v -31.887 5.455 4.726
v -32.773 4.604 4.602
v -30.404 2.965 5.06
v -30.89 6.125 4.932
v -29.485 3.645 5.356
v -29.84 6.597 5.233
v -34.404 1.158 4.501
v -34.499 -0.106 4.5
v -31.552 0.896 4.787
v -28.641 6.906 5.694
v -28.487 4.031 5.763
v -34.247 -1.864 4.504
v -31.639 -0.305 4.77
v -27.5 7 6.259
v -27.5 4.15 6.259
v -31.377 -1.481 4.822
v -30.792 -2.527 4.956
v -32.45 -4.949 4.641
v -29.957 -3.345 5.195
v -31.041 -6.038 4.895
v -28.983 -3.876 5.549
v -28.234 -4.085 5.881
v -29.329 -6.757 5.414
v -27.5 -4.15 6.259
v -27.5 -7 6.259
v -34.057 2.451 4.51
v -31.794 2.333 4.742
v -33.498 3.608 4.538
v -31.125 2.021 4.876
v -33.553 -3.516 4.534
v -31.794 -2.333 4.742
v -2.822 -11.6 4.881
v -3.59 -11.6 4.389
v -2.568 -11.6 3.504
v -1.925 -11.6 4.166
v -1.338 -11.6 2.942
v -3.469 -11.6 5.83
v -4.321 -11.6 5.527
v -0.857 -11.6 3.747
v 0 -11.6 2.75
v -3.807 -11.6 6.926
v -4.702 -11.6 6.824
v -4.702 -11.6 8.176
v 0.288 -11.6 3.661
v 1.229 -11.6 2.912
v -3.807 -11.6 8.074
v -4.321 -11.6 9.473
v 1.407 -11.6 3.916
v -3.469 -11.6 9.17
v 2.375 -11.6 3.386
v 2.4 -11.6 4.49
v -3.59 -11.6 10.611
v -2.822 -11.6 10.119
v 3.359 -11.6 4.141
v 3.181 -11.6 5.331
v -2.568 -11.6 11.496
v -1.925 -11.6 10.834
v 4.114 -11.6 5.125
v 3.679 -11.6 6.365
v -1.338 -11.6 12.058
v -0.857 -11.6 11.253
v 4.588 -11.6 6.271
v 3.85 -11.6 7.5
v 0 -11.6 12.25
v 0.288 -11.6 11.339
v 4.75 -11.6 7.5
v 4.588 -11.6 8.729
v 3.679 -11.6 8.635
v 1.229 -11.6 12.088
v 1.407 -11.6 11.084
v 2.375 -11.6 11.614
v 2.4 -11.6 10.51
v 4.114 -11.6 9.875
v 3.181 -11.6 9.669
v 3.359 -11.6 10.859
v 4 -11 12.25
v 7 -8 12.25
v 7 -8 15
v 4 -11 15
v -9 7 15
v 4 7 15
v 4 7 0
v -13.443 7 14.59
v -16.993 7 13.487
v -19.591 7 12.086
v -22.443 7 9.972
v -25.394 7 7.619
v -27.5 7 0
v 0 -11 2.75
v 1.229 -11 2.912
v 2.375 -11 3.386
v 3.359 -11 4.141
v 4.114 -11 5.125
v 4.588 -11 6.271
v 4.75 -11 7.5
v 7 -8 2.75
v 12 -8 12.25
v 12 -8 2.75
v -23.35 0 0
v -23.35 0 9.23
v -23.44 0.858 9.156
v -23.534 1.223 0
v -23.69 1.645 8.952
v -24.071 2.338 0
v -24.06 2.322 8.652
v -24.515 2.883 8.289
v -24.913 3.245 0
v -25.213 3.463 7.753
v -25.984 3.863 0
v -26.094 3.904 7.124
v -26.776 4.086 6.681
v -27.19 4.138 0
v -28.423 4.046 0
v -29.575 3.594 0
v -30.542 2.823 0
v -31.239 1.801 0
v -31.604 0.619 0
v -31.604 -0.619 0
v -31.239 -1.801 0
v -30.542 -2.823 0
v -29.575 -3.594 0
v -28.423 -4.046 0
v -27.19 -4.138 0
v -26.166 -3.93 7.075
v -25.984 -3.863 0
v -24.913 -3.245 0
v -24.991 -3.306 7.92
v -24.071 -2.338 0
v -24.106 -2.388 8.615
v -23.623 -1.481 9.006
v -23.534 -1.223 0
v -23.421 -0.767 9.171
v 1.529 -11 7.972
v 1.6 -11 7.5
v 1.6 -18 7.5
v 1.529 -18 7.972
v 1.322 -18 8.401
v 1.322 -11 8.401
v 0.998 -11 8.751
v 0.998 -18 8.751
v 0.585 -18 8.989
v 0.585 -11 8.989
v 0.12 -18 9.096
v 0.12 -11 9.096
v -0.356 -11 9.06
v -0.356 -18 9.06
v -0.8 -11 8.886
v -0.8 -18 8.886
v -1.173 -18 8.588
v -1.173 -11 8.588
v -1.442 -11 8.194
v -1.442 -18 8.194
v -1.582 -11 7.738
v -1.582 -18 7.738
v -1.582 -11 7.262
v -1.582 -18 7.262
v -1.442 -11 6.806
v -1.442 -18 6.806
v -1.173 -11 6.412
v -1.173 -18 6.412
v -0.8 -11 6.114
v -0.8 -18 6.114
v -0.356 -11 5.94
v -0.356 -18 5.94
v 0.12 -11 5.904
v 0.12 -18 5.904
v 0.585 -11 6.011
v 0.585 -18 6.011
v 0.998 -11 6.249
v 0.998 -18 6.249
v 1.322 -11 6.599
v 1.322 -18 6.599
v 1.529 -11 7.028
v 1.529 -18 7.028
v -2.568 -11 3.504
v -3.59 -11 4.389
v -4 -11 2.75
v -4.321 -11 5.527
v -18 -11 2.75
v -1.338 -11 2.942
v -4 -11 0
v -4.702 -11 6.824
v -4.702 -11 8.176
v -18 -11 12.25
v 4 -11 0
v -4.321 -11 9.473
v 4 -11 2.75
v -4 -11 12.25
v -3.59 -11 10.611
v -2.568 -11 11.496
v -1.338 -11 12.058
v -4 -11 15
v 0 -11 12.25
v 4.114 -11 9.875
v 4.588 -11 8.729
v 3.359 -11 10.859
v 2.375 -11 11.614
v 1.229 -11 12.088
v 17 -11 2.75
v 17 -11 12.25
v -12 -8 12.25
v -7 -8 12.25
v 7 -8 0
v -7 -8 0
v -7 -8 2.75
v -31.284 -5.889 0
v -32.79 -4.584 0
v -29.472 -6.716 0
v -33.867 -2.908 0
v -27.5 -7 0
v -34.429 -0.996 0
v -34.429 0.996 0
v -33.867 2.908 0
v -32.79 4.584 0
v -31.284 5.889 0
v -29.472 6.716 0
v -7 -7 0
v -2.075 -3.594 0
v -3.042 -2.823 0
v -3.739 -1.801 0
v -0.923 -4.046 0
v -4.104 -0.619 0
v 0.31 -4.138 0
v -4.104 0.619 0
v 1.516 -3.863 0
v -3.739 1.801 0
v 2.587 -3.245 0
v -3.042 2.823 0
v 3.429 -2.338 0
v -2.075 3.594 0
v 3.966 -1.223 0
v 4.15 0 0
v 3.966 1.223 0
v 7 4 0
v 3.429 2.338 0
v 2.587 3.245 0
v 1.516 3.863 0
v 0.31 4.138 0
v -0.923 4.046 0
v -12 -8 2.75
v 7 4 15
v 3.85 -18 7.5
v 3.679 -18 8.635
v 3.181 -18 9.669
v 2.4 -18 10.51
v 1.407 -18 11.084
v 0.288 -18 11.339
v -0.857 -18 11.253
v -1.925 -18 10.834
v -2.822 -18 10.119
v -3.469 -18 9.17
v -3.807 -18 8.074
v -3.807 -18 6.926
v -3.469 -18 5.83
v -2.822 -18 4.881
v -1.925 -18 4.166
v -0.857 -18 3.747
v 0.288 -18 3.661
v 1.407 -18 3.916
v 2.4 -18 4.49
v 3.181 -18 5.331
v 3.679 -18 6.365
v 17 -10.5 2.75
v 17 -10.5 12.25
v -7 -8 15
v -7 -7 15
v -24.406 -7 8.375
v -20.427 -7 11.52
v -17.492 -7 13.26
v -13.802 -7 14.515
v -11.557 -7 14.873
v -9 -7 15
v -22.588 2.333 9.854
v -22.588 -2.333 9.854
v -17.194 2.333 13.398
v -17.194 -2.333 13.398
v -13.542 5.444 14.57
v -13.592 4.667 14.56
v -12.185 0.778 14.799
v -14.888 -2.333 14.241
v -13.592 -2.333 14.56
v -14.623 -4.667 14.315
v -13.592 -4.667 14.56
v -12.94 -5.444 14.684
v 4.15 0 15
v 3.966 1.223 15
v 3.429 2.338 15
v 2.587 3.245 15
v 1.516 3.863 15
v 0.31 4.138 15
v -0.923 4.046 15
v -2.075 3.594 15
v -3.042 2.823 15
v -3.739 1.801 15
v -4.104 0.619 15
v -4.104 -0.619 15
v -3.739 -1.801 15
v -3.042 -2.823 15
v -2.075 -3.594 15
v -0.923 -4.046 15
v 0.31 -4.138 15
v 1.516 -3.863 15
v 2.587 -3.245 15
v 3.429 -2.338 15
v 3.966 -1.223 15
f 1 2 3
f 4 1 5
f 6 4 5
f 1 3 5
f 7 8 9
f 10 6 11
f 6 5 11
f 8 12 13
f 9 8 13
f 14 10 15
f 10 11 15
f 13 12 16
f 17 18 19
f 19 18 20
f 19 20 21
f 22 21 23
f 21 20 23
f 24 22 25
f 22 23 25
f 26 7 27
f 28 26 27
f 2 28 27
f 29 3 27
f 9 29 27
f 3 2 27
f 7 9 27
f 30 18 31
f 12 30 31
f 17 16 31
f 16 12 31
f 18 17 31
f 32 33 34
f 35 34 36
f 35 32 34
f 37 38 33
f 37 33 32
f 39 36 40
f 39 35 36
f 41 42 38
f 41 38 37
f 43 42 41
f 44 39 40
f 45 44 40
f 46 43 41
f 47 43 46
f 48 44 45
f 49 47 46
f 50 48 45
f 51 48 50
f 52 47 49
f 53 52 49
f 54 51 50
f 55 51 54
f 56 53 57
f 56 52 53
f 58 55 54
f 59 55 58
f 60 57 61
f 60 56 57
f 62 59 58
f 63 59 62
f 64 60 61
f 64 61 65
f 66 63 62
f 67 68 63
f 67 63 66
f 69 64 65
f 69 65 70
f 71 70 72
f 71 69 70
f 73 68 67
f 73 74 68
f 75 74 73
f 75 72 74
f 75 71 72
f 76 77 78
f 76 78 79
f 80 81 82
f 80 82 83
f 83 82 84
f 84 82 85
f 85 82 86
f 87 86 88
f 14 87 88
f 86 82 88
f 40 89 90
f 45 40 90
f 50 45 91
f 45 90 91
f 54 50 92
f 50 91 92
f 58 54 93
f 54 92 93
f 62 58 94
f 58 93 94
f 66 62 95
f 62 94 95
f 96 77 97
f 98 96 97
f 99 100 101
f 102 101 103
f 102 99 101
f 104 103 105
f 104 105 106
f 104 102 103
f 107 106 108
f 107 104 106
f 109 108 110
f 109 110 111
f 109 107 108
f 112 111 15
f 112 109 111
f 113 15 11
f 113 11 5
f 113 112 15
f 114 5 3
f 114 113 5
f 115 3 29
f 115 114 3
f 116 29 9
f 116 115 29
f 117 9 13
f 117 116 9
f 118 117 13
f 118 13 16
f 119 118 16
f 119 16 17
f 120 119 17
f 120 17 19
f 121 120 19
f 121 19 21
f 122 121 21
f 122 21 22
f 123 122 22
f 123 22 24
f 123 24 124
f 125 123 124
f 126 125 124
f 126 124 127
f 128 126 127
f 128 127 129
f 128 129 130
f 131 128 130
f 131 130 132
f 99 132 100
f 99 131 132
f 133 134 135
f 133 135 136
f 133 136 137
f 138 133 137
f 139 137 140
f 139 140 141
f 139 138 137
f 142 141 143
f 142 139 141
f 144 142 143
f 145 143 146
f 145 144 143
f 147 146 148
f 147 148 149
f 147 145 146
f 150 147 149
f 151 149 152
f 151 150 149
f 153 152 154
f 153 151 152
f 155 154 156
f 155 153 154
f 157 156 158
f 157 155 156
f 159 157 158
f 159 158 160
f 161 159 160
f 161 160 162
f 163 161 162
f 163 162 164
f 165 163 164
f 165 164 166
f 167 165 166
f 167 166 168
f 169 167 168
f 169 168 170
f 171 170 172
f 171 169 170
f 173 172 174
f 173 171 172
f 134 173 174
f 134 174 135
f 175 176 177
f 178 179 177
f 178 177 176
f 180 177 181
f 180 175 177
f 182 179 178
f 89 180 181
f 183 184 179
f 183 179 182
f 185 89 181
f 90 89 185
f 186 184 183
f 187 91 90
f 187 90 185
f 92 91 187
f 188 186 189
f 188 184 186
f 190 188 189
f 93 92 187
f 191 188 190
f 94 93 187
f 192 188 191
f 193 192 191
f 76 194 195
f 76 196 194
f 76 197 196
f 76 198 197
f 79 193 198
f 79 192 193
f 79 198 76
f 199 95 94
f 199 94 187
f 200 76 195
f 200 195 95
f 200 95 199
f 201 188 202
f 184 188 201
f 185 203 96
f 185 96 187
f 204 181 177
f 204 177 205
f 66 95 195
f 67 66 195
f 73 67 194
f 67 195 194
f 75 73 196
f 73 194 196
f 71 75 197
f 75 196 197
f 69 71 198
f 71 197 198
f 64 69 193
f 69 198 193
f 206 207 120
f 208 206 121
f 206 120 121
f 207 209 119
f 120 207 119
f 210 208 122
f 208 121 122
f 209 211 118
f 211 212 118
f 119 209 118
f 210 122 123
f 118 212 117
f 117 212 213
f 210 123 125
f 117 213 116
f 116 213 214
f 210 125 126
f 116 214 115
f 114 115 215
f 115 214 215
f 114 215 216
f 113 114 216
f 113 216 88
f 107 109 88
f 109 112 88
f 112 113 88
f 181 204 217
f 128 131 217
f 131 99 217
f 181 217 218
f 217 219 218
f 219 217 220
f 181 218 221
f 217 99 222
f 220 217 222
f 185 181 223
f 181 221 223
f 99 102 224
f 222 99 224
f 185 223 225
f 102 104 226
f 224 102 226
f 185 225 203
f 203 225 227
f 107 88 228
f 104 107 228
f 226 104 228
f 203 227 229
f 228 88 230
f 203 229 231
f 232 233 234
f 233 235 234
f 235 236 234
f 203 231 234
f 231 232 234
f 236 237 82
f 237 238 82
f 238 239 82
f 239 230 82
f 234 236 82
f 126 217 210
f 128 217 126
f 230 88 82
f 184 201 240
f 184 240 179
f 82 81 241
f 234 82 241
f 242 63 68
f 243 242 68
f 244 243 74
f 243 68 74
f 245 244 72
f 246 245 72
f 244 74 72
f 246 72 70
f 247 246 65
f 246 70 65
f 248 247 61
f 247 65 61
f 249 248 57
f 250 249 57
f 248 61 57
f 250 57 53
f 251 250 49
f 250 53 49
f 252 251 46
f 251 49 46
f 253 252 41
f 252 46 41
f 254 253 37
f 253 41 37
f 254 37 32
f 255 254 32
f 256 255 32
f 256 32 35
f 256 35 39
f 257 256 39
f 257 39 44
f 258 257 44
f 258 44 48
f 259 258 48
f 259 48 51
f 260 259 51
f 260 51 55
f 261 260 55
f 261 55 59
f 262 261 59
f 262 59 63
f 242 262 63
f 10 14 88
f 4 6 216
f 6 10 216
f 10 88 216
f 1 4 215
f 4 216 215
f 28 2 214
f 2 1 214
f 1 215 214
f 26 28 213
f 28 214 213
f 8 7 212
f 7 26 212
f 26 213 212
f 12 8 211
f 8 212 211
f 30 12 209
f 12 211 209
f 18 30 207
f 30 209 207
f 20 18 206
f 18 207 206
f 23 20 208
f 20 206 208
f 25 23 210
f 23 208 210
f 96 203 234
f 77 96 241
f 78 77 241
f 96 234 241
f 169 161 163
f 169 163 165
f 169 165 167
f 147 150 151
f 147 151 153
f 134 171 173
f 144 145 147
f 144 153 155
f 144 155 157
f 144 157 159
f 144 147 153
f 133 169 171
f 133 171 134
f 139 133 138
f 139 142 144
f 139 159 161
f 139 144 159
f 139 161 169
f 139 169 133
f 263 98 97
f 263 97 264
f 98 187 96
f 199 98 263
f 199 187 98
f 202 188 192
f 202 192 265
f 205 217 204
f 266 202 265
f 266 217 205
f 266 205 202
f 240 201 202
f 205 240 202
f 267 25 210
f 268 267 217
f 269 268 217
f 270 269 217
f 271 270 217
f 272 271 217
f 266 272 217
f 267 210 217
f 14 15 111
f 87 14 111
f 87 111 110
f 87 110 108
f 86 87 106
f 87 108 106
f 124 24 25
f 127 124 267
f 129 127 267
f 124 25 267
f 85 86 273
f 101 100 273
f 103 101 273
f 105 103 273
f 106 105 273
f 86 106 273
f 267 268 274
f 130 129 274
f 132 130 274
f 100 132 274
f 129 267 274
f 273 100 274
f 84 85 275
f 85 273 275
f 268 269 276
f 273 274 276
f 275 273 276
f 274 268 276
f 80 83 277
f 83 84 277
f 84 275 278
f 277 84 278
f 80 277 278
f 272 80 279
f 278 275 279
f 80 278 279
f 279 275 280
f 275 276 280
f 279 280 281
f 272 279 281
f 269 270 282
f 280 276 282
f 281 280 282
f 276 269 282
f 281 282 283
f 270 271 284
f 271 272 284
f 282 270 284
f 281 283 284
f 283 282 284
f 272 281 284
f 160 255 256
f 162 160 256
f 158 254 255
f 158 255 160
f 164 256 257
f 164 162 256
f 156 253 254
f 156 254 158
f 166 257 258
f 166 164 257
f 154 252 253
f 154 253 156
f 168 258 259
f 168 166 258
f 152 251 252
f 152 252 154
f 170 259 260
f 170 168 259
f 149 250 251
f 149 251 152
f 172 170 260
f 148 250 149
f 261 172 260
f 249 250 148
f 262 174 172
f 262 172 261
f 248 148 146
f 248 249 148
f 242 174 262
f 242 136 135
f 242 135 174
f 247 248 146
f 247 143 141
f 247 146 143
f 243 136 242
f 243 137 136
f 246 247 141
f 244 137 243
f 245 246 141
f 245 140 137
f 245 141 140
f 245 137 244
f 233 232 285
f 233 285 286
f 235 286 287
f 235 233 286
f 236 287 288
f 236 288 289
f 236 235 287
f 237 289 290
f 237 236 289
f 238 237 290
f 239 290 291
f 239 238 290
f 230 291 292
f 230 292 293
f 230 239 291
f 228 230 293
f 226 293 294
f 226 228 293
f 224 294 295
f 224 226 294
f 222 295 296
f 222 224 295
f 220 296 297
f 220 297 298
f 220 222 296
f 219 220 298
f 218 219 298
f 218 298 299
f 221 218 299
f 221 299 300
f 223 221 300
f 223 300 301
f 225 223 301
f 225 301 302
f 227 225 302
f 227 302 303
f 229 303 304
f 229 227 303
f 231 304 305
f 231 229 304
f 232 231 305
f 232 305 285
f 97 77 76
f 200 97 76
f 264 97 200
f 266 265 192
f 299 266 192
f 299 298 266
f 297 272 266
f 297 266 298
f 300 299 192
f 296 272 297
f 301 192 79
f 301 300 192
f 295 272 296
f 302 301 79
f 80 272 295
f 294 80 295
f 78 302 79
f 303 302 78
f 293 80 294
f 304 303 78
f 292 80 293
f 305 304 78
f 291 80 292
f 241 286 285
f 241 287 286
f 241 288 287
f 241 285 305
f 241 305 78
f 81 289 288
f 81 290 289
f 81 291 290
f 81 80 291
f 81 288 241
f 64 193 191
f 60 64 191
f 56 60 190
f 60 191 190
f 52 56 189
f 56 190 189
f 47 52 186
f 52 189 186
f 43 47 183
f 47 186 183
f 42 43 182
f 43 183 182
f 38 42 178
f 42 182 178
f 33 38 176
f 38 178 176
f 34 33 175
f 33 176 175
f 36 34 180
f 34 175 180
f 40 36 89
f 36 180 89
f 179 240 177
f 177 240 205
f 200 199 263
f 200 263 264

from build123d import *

# Parameters (mm, degrees)
F0_R         = 4.15
F1_DEPTH     = 15
F2_W         = 14
F2_H         = 15
F3_DEPTH     = 4
F4_R         = 3.85
F5_DEPTH     = 3
F6_T1_DEPTH  = 40.5779464854
F4_R_2       = 1.6
F7_DEPTH     = 7
F8_DEPTH     = 0.6
F10_DEPTH    = 25
F11_T1_DEPTH = 30.4300979278
F11_T3_DEPTH = 10.4650489639
F11_T5_DEPTH = 10.4650489639


# Not quite as in the source:
# - a fillet or chamfer that OpenCascade refuses, or shapes differently, is made with other operations: its cross-section is extruded or revolved along the edge and cut away or added


with BuildPart() as f1:
    # F0 (on Top) → F1 (new body)
    with BuildSketch(Plane.XY):
        with BuildLine():
            Line((7, 7), (-27.5, 7))
            ThreePointArc((-27.5, 7), (-34.5, 0), (-27.5, -7))
            Line((-27.5, -7), (7, -7))
            Line((7, -7), (7, 7))
        make_face()
        with Locations((-27.5, 0)):
            Circle(F0_R, mode=Mode.SUBTRACT)
        Circle(F0_R, mode=Mode.SUBTRACT)
    extrude(amount=F1_DEPTH)

    # F2 (on face) → F3 (join)
    with BuildSketch(Plane.XZ.offset(7)):
        with Locations((0, 7.5)):
            Rectangle(F2_W, F2_H)
    extrude(amount=F3_DEPTH)

    # F4 (on face) → F5 (join)
    with BuildSketch(Plane.XZ.offset(11)):
        with BuildLine():
            ThreePointArc((0, 2.75), (3.3587572106, 4.1412427894), (4.75, 7.5))
            ThreePointArc((4.75, 7.5), (3.3587572106, 10.8587572106), (0, 12.25))
            ThreePointArc((0, 12.25), (-4.75, 7.5), (0, 2.75))
        make_face()
        with Locations((0, 7.5)):
            Circle(F4_R, mode=Mode.SUBTRACT)
        with BuildLine():
            ThreePointArc((0, 12.25), (3.3587572106, 10.8587572106), (4.75, 7.5))
            ThreePointArc((4.75, 7.5), (3.3587572106, 4.1412427894), (0, 2.75))
            Line((0, 2.75), (18, 2.75))
            Line((18, 2.75), (18, 12.25))
            Line((18, 12.25), (0, 12.25))
        make_face()
        with BuildLine():
            ThreePointArc((0, 2.75), (-4.75, 7.5), (0, 12.25))
            Line((0, 12.25), (-18, 12.25))
            Line((-18, 12.25), (-18, 2.75))
            Line((-18, 2.75), (0, 2.75))
        make_face()
    extrude(amount=-F5_DEPTH)

    # F6: chamfer of 3 x 6 on 2 edges, made by hand

    # F6_s2 → F6_t1 (cut)
    with BuildSketch(Plane.XY.offset(-12.7889732427)):
        Polygon((-12, -8), (-18, -11), (-18, -8), align=None)
        Polygon((12, -8), (18, -11), (18, -8), align=None)
    extrude(amount=F6_T1_DEPTH, mode=Mode.SUBTRACT)

    # F4 (on face) → F7 (join)
    with BuildSketch(Plane.XZ.offset(11)):
        with Locations((0, 7.5)):
            Circle(F4_R)
        with Locations((0, 7.5)):
            Circle(F4_R_2, mode=Mode.SUBTRACT)
    extrude(amount=F7_DEPTH)

    # F4 (on face) → F8 (join)
    with BuildSketch(Plane.XZ.offset(11)):
        with BuildLine():
            ThreePointArc((0, 2.75), (3.3587572106, 4.1412427894), (4.75, 7.5))
            ThreePointArc((4.75, 7.5), (3.3587572106, 10.8587572106), (0, 12.25))
            ThreePointArc((0, 12.25), (-4.75, 7.5), (0, 2.75))
        make_face()
        with Locations((0, 7.5)):
            Circle(F4_R, mode=Mode.SUBTRACT)
    extrude(amount=F8_DEPTH)

    # F9 (on face) → F10 (intersect, symmetric)
    with BuildSketch(Plane.XZ.offset(7)):
        with BuildLine():
            Line((-27.5, 6.2586253838), (-27.5, 0))
            Line((-27.5, 0), (-7, 0))
            Line((-7, 0), (-7, 15))
            Line((-7, 15), (-9, 15))
            add(Edge.make_bspline(
                [(-27.5, 6.2586253838), (-22.0570868036, 9.2486118384), (-19.3657420182, 15), (-9, 15)],
                knots=[7.0475438496, 7.0475438496, 7.0475438496, 7.0475438496, 27.5771644663, 27.5771644663, 27.5771644663, 27.5771644663], degree=3))
        make_face()
        with BuildLine():
            Line((-34.5, 4.5), (-34.5, 0))
            Line((-34.5, 0), (-27.5, 0))
            Line((-27.5, 0), (-27.5, 6.2586253838))
            add(Edge.make_bspline(
                [(-34.5, 4.5), (-31.5612189253, 4.5312000669), (-29.3684792153, 5.2322030722), (-27.5, 6.2586253838)],
                knots=[0, 0, 0, 0, 7.0475438496, 7.0475438496, 7.0475438496, 7.0475438496], degree=3))
        make_face()
        Polygon((-7, 15), (-7, 0), (0, 0), (17, 0), (17, 15), align=None)
    extrude(amount=F10_DEPTH, both=True, mode=Mode.INTERSECT)

    # F11: chamfer of 3 on 6 edges, made by hand

    # F11_s2 → F11_t1 (cut)
    with BuildSketch(Plane.XY.offset(-7.7150489639)):
        Polygon((4, 7), (7, 4), (7, 7), align=None)
    extrude(amount=F11_T1_DEPTH, mode=Mode.SUBTRACT)

    # F11_s4 → F11_t3 (cut)
    with BuildSketch(Plane.XY.offset(12.25)):
        Polygon((-4, -11), (-7, -8), (-7, -11), align=None)
        Polygon((7, -8), (4, -11), (7, -11), align=None)
    extrude(amount=F11_T3_DEPTH, mode=Mode.SUBTRACT)

    # F11_s6 → F11_t5 (cut)
    with BuildSketch(Plane.XY.offset(-7.7150489639)):
        Polygon((-4, -11), (-7, -8), (-7, -11), align=None)
        Polygon((7, -8), (4, -11), (7, -11), align=None)
    extrude(amount=F11_T5_DEPTH, mode=Mode.SUBTRACT)


solid = f1.part
